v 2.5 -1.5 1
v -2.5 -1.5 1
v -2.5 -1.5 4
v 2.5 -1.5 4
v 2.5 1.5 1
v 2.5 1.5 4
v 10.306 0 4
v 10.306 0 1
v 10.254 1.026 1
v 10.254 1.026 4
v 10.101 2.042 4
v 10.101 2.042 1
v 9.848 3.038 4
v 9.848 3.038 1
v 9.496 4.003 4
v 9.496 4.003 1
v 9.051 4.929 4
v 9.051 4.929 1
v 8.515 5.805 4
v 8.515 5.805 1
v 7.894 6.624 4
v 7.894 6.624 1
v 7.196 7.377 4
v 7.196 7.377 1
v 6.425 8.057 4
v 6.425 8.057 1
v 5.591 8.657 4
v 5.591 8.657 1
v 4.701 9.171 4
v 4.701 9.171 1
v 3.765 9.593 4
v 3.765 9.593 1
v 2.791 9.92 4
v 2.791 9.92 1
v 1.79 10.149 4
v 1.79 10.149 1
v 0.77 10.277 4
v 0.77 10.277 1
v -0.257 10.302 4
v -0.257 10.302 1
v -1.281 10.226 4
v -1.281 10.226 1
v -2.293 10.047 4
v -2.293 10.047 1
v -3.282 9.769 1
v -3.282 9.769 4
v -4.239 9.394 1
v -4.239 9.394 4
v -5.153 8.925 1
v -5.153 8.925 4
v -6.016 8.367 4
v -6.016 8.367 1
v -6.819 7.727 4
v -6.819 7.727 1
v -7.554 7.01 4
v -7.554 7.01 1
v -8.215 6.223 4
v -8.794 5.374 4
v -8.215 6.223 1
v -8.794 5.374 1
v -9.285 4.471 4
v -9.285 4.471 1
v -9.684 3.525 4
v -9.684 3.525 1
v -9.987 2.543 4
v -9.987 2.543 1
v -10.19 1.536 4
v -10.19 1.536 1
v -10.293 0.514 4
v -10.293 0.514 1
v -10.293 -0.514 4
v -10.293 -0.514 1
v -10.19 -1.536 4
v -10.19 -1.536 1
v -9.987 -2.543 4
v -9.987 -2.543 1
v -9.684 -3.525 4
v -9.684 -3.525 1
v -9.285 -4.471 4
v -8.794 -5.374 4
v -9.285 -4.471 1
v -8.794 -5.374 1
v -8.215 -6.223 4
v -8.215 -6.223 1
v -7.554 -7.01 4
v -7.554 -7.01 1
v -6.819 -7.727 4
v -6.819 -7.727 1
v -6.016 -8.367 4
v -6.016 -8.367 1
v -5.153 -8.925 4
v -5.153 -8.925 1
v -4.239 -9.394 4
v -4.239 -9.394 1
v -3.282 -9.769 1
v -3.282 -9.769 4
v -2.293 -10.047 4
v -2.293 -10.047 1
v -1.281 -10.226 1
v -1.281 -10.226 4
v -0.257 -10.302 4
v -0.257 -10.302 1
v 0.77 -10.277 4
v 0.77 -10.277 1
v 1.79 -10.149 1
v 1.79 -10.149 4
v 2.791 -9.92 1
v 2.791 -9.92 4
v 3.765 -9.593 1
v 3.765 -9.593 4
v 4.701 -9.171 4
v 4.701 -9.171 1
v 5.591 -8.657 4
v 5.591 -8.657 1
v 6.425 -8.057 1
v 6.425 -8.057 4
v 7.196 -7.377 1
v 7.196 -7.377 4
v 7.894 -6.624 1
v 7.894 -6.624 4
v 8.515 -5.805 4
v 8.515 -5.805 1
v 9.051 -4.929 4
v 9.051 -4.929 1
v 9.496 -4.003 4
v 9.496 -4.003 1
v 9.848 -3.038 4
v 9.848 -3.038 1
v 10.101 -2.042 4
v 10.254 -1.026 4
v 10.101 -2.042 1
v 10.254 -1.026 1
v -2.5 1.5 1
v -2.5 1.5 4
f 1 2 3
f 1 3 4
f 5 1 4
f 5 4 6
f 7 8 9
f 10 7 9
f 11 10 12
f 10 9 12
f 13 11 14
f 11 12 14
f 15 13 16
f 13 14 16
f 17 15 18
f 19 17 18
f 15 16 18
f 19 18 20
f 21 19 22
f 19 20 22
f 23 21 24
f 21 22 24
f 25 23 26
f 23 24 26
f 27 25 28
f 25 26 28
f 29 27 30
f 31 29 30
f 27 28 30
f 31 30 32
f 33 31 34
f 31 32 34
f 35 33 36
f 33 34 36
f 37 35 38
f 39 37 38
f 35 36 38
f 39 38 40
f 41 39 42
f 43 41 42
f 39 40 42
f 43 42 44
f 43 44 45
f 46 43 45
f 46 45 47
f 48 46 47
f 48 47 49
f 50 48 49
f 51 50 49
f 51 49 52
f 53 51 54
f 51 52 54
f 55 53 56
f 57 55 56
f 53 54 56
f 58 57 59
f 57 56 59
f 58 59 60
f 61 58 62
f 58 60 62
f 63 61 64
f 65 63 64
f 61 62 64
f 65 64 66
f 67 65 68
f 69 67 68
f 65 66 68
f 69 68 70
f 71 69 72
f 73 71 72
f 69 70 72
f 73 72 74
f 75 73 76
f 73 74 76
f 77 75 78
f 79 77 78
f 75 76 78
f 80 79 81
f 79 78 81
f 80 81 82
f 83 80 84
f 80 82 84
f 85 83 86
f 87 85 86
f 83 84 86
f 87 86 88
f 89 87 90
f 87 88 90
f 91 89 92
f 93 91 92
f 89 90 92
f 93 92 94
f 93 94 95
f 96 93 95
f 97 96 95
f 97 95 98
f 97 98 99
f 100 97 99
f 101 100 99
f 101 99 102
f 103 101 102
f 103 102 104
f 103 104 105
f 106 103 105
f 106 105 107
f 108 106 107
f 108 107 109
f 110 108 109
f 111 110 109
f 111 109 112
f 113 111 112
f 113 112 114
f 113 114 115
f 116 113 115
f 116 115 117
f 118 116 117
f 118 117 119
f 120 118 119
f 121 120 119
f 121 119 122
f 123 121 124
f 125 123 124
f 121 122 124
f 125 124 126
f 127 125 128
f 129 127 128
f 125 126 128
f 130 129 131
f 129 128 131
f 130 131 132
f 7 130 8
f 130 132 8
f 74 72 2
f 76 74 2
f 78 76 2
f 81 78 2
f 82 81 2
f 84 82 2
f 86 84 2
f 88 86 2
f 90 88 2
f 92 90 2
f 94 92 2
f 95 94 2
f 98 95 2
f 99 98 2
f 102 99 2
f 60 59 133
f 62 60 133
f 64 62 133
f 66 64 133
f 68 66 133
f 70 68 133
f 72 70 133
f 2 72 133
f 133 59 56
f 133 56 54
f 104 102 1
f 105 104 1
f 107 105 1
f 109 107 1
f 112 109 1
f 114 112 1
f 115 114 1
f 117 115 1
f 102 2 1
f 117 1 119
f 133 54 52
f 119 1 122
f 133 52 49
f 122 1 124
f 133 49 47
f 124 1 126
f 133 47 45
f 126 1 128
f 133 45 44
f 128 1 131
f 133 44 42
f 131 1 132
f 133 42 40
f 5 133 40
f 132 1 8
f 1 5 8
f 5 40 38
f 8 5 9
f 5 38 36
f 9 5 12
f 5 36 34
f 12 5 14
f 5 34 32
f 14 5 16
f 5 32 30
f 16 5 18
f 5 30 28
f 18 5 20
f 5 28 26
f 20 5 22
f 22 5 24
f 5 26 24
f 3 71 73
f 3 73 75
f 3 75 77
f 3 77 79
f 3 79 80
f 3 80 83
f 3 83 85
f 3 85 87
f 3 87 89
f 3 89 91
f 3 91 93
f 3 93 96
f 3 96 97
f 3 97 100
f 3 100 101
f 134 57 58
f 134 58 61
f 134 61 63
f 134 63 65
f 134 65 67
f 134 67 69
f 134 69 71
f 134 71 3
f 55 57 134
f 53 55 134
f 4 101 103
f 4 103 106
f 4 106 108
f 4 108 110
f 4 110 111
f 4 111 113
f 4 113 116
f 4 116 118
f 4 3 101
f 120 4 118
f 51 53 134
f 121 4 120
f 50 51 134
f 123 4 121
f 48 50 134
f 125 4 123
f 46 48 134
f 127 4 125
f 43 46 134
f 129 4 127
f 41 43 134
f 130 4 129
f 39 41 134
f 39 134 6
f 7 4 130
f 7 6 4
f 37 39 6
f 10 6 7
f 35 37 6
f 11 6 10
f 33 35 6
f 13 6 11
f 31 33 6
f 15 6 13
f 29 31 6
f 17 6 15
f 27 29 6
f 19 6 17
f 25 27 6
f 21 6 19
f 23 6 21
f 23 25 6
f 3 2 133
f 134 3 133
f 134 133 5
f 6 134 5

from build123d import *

# Parameters (mm, degrees)
SKETCH2_R           = 10.30551588
SKETCH2_W           = 5
SKETCH2_H           = 3
BOSS_EXTRUDE1_DEPTH = 3


# Read off the part's stored shape, not the designer's step: Gear 60pitch part02.STEP
with BuildPart() as part:
    # Sketch2 → Boss-Extrude1 (new body)
    with BuildSketch(Plane.XY.offset(1)):
        Circle(SKETCH2_R)
        Rectangle(SKETCH2_W, SKETCH2_H, mode=Mode.SUBTRACT)
    extrude(amount=BOSS_EXTRUDE1_DEPTH)


solid = part.part
